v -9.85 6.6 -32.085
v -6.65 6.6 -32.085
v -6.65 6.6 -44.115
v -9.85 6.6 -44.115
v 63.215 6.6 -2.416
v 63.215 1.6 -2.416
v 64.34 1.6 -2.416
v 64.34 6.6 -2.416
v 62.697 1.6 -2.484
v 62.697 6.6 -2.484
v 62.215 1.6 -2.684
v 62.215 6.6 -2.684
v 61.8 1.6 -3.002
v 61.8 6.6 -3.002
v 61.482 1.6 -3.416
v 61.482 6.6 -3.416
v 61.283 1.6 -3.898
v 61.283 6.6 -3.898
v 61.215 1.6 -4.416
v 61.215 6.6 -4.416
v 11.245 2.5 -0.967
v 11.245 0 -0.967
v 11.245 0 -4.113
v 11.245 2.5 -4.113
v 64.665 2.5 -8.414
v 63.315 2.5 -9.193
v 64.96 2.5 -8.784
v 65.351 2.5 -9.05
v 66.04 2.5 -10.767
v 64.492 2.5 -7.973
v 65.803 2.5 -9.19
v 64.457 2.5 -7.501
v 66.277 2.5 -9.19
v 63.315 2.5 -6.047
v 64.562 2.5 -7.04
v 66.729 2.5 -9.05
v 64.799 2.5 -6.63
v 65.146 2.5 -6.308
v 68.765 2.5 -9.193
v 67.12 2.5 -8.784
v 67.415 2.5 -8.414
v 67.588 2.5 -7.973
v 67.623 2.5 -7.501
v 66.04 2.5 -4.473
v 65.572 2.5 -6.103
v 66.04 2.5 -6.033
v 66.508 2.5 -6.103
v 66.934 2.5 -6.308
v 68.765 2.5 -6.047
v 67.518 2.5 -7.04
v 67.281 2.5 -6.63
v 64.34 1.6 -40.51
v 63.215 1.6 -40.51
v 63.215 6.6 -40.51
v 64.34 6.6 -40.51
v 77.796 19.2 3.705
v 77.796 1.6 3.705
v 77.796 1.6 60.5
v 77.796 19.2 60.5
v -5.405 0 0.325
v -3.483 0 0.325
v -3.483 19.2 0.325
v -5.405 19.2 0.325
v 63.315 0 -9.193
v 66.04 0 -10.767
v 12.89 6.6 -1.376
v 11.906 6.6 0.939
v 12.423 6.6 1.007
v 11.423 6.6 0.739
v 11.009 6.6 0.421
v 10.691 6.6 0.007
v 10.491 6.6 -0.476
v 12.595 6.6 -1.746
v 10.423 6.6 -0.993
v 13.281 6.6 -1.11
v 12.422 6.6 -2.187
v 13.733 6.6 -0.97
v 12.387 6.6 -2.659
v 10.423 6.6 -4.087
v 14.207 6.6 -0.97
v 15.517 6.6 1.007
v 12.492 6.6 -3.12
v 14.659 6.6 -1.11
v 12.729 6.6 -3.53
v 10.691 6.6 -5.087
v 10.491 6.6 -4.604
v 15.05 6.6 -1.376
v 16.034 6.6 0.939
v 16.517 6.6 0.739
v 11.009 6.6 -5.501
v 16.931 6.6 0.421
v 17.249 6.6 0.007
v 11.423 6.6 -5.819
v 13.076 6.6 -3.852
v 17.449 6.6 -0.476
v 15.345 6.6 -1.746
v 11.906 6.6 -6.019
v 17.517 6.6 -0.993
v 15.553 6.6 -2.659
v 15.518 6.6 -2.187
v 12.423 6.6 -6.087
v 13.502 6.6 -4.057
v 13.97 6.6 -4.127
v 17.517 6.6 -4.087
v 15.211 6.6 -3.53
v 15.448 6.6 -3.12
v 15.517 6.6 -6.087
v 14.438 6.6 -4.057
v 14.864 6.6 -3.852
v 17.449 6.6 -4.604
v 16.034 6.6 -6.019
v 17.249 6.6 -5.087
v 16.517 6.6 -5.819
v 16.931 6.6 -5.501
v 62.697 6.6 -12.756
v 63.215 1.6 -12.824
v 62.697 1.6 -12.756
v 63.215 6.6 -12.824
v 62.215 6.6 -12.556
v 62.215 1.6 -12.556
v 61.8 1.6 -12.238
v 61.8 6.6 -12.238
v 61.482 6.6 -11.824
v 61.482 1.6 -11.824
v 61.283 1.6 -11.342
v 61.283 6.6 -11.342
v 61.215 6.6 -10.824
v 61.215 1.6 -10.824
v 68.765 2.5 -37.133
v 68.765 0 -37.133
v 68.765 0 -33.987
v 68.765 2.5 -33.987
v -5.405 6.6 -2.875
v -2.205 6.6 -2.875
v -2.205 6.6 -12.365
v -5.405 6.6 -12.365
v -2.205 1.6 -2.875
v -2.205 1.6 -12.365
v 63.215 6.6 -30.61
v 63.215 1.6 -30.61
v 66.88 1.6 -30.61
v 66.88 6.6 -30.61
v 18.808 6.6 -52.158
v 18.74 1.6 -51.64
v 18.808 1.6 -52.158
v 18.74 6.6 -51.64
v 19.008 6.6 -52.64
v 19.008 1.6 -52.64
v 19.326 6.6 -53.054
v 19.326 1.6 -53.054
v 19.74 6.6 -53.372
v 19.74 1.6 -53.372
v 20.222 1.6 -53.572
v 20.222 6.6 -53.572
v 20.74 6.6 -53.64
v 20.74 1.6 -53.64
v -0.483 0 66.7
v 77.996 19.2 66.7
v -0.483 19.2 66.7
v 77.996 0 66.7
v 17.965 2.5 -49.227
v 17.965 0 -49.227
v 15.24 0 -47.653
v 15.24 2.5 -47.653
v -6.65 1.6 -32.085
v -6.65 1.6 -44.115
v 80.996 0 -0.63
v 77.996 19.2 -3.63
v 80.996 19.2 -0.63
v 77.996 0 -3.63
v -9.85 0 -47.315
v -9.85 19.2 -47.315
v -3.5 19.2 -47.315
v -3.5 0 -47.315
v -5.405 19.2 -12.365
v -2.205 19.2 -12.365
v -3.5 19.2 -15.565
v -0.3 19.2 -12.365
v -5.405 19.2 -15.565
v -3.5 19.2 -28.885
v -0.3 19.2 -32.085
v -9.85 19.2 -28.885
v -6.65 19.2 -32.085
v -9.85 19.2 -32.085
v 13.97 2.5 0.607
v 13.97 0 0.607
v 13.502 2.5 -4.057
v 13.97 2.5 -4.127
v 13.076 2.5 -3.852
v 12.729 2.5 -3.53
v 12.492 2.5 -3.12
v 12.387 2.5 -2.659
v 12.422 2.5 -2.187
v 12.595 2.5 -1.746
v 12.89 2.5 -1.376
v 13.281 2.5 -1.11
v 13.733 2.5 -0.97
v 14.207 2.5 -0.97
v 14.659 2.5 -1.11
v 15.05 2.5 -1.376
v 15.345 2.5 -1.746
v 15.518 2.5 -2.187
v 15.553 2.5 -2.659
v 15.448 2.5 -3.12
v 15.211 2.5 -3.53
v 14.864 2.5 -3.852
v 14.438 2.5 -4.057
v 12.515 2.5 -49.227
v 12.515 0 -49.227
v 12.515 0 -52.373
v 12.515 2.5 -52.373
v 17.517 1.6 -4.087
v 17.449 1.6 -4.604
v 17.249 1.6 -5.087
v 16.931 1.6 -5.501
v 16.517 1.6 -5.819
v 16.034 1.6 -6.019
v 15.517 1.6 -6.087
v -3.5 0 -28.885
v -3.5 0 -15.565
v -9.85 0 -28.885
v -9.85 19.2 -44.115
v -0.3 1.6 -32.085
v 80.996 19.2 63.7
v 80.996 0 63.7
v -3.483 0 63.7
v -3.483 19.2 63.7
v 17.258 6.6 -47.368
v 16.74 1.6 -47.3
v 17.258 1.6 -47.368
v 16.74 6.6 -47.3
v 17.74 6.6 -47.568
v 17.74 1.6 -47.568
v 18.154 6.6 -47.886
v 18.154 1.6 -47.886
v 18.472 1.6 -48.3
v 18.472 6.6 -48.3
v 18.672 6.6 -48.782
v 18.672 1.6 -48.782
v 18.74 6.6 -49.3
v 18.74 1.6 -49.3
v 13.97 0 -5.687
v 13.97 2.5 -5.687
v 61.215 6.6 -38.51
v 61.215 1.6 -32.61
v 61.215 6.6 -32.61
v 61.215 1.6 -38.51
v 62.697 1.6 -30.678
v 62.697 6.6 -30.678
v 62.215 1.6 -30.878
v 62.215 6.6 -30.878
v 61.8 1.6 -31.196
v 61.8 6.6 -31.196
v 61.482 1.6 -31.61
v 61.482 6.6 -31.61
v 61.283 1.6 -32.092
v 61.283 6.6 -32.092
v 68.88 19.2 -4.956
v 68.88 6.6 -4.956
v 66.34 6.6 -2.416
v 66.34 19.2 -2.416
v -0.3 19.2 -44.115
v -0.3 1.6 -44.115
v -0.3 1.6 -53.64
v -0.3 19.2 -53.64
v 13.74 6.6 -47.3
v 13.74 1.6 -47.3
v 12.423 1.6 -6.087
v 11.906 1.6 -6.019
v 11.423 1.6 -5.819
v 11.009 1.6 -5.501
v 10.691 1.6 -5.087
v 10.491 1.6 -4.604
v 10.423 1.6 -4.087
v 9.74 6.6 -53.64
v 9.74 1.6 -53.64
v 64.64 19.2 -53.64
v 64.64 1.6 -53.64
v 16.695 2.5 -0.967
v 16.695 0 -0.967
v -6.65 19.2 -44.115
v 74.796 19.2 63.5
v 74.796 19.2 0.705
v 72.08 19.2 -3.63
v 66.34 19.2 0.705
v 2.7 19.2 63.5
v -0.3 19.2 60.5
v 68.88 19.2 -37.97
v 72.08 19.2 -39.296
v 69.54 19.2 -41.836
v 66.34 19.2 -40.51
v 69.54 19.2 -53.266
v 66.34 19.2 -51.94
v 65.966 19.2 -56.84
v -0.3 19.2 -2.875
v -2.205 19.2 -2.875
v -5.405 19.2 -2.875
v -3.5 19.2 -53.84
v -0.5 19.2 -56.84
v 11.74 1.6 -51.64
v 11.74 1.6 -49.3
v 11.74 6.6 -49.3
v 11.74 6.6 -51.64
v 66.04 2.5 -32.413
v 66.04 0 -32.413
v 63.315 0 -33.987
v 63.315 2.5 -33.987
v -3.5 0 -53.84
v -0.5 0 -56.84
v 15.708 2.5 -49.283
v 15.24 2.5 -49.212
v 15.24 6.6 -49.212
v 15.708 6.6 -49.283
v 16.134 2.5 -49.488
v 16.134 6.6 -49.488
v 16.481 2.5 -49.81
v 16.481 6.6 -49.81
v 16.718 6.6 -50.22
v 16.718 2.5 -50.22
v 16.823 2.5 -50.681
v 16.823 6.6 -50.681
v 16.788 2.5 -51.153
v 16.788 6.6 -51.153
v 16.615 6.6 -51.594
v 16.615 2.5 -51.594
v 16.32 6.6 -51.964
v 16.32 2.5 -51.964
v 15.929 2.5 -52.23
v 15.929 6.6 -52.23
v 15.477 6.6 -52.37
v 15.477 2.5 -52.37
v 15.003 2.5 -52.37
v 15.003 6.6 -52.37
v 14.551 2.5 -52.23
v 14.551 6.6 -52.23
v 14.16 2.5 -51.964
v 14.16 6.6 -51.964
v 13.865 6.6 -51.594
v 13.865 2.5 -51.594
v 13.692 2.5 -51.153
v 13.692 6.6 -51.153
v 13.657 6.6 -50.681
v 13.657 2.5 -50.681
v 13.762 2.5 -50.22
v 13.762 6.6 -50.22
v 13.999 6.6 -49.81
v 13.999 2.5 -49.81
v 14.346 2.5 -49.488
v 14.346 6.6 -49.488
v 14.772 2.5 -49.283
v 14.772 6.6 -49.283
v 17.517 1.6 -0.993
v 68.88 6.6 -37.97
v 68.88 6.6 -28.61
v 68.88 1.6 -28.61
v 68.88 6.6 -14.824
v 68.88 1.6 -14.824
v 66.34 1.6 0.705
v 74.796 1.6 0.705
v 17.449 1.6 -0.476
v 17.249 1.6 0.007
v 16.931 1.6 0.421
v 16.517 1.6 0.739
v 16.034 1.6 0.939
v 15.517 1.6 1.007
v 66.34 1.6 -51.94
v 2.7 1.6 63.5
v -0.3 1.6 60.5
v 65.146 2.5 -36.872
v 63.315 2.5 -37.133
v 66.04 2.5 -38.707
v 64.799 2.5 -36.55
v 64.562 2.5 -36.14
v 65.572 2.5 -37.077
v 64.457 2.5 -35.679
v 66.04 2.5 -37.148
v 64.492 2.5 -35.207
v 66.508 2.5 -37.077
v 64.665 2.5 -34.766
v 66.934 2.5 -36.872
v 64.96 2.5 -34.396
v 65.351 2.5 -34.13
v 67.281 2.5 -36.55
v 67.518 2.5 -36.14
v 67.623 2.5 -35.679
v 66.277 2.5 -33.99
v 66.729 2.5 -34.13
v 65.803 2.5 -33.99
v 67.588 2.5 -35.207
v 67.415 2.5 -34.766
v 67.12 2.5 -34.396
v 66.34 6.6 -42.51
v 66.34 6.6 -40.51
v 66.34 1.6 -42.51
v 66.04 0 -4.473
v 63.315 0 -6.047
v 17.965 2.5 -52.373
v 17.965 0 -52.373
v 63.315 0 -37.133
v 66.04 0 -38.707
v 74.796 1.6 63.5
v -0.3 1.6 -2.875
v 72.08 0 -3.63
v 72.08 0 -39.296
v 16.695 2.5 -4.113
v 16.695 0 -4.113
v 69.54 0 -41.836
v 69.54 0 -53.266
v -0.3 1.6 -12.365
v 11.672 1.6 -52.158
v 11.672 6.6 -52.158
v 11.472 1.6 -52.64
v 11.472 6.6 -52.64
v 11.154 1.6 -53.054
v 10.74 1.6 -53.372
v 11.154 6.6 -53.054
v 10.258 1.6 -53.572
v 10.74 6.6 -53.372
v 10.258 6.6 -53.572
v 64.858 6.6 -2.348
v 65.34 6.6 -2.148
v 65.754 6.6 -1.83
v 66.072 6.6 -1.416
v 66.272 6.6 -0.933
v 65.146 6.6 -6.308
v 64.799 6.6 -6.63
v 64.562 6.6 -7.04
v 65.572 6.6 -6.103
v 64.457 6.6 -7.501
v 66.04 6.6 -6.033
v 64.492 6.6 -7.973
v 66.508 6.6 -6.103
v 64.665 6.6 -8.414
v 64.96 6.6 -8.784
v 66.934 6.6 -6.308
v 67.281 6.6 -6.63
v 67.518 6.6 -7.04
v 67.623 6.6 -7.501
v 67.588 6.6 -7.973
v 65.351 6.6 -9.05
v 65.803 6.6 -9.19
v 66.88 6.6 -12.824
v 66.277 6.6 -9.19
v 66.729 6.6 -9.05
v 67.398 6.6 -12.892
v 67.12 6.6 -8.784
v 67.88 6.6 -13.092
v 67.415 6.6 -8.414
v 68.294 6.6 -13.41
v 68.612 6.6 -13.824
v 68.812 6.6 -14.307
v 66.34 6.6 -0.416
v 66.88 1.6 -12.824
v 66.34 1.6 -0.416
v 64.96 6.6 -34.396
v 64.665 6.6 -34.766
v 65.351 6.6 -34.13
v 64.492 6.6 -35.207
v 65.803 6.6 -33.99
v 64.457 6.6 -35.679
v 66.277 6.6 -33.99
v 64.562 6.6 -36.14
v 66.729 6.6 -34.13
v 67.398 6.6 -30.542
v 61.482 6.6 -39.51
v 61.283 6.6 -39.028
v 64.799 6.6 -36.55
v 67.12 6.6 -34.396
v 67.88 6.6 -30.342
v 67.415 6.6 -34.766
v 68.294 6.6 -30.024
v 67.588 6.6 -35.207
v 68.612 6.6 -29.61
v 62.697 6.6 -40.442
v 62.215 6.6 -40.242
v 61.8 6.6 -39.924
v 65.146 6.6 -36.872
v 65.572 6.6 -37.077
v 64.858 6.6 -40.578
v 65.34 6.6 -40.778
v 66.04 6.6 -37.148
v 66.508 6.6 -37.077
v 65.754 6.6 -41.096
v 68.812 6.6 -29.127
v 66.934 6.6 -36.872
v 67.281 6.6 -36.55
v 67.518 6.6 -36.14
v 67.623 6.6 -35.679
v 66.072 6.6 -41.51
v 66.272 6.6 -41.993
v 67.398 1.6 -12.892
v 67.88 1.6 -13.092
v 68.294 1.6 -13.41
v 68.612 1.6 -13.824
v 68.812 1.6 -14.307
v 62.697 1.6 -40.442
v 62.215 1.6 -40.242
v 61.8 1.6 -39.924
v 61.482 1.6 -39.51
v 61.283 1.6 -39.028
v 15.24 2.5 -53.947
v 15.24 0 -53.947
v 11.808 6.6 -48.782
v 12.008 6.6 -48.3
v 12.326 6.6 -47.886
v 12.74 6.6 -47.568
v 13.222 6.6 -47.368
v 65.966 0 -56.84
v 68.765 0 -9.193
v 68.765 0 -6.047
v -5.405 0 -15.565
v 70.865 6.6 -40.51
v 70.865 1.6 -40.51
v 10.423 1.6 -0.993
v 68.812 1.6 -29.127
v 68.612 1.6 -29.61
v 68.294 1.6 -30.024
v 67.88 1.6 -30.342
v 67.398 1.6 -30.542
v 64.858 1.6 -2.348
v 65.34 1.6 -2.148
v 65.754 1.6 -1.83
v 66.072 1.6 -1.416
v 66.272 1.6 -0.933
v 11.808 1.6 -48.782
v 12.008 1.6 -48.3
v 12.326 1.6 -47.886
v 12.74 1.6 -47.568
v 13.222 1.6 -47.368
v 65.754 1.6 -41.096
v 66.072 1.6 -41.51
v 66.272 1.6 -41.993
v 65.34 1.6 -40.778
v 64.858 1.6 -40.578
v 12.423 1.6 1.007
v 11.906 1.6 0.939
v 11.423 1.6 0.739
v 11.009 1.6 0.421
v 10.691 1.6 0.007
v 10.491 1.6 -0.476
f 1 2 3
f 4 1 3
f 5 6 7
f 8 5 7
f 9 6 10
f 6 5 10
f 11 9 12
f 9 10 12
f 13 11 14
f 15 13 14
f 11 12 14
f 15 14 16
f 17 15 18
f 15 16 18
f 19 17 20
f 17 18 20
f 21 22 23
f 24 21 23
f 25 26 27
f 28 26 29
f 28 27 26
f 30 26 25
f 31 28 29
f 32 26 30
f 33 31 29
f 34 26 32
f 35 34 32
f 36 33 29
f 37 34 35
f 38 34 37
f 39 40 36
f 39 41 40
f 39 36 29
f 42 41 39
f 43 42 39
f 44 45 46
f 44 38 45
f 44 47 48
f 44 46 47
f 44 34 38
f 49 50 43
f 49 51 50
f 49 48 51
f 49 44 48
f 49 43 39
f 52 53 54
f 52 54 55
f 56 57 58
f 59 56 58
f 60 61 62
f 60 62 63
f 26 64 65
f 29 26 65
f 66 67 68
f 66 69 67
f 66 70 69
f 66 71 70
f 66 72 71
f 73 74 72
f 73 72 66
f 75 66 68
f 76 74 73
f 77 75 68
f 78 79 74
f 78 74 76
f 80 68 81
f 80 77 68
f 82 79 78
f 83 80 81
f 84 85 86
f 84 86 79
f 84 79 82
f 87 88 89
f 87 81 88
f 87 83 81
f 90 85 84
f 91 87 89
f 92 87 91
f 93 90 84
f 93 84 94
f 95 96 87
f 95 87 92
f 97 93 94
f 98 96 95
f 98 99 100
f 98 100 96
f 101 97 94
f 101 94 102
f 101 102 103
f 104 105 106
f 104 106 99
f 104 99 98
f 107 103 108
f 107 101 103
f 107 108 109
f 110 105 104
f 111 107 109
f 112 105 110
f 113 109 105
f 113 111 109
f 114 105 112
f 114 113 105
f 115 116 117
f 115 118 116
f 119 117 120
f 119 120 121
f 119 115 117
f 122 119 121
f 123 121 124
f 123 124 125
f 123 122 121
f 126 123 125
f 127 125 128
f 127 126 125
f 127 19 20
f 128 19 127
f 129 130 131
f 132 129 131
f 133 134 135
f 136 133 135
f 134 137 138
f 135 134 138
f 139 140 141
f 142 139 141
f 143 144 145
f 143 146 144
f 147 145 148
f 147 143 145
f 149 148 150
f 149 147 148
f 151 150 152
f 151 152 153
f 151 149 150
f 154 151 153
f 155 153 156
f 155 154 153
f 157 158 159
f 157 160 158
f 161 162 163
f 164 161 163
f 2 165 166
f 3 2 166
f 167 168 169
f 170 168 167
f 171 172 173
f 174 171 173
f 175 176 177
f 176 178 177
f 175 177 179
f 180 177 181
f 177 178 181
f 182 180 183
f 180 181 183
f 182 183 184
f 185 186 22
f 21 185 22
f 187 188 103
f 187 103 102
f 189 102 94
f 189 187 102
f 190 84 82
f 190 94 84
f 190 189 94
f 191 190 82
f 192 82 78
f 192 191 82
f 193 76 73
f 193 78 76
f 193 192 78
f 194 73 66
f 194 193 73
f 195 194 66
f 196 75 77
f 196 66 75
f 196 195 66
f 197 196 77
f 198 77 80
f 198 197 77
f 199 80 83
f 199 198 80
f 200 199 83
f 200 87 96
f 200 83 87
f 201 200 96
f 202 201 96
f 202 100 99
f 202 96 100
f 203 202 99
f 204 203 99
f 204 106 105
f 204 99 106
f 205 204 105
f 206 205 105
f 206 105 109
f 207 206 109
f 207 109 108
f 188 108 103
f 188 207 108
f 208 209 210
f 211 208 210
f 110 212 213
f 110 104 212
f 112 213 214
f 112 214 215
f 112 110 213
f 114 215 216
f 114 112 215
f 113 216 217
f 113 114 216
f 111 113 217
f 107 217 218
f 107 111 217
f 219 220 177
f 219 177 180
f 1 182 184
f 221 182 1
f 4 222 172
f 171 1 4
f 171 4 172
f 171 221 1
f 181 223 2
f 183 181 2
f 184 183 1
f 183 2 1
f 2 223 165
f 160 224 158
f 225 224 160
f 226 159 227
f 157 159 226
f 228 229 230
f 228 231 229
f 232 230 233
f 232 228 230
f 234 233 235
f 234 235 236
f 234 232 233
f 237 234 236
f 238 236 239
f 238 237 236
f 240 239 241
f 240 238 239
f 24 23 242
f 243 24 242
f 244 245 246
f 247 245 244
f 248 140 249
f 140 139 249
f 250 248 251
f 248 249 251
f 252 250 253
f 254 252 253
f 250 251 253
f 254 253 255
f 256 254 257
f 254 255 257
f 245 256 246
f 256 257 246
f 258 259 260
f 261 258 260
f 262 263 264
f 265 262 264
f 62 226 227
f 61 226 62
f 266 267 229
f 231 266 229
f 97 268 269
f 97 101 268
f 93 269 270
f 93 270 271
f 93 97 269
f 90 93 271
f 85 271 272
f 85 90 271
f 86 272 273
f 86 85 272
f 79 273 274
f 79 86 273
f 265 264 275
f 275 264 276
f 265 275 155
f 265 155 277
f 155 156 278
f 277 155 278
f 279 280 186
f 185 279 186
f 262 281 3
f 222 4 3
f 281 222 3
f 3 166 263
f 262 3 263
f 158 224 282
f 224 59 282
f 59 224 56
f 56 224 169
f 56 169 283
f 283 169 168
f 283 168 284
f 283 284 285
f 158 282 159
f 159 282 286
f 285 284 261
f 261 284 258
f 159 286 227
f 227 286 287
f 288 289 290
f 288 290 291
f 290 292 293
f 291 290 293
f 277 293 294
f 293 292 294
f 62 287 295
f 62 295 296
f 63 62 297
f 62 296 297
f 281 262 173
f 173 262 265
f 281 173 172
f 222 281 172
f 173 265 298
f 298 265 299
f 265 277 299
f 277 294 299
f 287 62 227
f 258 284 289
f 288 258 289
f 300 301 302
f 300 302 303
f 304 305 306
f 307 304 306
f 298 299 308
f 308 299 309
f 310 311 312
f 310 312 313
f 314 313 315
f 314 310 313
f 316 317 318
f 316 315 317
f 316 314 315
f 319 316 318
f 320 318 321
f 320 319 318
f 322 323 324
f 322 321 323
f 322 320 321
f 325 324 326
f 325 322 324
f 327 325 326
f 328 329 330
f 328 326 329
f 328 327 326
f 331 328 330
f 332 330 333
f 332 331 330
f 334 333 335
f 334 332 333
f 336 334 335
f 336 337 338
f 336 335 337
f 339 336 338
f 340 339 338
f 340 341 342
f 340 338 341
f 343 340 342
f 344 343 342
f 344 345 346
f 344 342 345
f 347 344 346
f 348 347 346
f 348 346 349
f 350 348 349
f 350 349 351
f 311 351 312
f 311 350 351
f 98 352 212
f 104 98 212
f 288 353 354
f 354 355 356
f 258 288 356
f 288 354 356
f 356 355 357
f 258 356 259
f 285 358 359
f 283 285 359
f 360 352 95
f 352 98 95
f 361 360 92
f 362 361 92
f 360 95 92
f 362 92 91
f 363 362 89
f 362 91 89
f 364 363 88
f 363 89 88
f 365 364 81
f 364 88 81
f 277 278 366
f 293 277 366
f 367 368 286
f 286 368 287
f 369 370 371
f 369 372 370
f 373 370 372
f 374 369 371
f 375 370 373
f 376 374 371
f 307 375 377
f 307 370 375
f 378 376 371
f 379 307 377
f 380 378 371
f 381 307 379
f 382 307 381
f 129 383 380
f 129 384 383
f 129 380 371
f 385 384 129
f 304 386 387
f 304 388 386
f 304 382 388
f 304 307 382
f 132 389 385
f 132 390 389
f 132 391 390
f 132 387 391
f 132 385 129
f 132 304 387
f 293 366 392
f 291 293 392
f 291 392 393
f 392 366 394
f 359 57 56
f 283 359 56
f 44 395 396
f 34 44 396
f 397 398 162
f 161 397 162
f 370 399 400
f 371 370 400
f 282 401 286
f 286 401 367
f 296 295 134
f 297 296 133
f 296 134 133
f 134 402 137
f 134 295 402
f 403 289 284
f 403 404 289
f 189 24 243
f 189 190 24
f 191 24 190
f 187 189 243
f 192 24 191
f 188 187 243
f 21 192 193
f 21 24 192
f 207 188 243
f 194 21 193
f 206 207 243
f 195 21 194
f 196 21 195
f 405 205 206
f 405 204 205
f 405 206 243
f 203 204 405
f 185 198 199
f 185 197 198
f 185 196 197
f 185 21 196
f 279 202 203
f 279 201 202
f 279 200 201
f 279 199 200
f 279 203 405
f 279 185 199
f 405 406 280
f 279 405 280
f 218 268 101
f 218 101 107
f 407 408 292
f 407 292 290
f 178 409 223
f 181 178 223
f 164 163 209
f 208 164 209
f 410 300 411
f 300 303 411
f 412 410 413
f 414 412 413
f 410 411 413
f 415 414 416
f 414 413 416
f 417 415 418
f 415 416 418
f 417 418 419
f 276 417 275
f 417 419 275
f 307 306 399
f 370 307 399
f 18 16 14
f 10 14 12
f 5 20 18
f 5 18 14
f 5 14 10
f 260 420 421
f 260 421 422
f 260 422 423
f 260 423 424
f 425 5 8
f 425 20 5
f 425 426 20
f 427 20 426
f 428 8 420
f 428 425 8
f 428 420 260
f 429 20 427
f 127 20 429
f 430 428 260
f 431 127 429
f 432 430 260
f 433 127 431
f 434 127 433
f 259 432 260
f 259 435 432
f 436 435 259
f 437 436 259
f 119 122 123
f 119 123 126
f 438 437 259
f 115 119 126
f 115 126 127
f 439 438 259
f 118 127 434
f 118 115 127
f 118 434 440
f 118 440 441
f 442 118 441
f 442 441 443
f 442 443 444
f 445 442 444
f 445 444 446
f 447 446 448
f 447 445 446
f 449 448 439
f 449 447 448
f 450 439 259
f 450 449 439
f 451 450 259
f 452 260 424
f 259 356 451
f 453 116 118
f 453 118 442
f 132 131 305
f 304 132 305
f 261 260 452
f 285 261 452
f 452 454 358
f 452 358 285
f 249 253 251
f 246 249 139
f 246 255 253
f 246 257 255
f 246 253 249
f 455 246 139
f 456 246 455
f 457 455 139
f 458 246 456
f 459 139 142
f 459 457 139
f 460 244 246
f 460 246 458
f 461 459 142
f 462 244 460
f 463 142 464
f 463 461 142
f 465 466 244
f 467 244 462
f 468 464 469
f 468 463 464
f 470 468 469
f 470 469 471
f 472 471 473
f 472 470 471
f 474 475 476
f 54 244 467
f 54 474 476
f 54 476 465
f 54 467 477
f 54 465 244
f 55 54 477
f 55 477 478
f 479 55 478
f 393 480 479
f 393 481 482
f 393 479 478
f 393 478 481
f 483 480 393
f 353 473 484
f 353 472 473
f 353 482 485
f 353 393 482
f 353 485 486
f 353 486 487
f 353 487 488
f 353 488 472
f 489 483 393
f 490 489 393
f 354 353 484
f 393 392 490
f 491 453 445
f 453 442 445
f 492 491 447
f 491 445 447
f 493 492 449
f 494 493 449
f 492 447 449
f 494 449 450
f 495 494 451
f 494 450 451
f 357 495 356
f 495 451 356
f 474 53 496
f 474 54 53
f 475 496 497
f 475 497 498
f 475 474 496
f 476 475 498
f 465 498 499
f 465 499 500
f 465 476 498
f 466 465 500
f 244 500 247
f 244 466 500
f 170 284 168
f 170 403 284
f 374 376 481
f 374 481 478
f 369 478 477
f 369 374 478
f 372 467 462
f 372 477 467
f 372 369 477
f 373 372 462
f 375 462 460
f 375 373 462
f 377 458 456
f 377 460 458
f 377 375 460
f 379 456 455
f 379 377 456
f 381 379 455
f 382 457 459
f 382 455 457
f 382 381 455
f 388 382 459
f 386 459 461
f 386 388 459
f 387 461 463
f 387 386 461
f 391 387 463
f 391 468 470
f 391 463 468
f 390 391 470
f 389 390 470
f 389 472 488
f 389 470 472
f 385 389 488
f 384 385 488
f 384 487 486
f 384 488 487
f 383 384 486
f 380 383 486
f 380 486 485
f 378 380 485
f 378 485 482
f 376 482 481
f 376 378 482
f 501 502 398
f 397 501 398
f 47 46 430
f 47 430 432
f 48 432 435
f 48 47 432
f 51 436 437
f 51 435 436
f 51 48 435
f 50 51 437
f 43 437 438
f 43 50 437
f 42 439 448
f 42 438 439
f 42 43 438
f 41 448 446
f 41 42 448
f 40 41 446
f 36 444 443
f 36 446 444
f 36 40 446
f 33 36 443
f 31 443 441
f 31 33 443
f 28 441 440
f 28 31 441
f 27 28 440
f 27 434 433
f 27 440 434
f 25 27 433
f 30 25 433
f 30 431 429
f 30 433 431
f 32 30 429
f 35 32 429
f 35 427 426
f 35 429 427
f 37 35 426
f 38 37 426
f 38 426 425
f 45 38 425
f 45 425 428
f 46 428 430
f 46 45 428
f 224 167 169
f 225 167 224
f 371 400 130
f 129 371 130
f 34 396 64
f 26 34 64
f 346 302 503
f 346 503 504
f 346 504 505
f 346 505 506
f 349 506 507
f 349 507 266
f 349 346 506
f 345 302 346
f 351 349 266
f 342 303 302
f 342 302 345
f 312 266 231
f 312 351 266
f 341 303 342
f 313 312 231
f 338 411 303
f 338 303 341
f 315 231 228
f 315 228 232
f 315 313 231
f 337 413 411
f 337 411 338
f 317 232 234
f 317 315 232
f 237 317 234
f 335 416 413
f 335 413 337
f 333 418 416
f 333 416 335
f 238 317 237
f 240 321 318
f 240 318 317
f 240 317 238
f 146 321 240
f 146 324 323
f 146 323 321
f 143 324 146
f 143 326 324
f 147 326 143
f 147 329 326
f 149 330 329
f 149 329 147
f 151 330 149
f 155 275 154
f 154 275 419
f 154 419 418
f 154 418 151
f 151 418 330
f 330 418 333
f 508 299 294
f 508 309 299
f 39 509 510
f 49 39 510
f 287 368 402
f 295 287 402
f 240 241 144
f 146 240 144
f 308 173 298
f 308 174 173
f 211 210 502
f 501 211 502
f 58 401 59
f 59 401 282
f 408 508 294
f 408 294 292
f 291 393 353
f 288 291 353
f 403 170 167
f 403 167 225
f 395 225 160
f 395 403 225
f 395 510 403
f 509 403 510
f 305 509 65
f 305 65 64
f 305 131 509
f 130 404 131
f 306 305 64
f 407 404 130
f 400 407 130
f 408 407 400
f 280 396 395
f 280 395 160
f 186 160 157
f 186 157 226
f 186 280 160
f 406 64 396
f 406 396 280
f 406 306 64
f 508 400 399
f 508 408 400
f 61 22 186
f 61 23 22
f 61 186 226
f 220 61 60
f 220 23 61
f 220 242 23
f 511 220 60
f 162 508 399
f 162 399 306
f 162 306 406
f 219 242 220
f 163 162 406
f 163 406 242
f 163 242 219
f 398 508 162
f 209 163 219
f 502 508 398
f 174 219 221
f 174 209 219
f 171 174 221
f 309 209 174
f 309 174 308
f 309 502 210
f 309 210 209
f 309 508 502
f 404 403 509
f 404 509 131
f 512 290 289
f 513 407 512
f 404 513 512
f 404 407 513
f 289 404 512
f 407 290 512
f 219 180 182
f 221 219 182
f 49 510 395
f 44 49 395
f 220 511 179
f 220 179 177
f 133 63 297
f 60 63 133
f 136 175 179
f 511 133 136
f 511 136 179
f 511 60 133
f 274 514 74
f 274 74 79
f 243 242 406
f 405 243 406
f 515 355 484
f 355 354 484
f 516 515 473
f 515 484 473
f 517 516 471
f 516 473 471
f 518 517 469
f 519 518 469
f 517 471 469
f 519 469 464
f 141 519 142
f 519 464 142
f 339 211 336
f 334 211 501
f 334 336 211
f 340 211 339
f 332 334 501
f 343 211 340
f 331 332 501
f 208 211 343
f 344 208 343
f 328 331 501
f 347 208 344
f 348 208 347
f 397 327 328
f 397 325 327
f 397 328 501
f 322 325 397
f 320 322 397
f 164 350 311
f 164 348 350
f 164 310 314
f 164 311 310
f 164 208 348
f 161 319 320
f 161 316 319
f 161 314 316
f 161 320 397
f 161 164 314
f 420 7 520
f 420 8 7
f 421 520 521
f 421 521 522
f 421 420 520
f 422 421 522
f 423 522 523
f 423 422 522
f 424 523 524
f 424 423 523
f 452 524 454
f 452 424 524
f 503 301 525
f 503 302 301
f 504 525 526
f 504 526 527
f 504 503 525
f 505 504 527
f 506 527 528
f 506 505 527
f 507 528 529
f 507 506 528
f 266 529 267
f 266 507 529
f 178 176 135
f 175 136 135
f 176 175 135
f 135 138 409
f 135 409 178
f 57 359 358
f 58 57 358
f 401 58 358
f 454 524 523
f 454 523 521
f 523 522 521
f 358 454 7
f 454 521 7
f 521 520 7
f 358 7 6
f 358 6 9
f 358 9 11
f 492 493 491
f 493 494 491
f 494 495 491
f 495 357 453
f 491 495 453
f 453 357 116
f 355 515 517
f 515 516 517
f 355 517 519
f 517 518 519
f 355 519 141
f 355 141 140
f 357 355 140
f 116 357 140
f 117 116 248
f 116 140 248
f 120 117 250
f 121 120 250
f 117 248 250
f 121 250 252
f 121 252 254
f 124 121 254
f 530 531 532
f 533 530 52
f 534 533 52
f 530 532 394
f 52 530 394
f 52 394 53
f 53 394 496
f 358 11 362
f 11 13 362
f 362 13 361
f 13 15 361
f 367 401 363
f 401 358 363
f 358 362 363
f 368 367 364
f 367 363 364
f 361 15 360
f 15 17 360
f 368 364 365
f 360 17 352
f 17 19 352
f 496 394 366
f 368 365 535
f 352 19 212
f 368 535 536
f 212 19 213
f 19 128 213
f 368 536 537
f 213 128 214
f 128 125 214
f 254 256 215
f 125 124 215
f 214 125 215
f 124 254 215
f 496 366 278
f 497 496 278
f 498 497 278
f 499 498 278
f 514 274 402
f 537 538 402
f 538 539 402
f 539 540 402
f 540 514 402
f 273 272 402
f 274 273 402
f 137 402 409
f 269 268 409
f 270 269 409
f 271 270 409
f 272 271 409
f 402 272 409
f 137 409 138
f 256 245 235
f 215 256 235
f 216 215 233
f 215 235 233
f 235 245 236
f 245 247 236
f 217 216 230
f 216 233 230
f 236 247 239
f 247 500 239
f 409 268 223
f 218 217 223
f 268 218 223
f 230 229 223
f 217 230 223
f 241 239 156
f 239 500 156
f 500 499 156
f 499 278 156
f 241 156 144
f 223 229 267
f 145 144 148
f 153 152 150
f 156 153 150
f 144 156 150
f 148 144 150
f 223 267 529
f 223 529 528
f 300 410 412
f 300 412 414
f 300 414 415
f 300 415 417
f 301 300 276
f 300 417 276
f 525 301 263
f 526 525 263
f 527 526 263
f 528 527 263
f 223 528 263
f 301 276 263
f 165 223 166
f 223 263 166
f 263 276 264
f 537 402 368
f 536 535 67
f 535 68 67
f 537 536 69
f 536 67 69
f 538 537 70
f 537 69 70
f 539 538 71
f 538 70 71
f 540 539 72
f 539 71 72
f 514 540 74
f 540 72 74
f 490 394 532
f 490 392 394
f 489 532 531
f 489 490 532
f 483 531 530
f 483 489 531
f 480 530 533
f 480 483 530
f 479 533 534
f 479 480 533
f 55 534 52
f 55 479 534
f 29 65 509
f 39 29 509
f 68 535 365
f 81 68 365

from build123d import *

# Parameters (mm, degrees)
BOSS_EXTRUDE1_DEPTH = 1.600000102
BOSS_EXTRUDE2_START = 1.6
BOSS_EXTRUDE2_DEPTH = 17.599999852
SKETCH7_W           = 6.999999716
SKETCH7_H           = 6.999999716
SKETCH7_W_2         = 9.650966474
SKETCH7_H_2         = 9.900528062
SKETCH7_H_3         = 10.408528062
SKETCH7_W_3         = 7.09362233
SKETCH7_H_4         = 7.09362233
BOSS_EXTRUDE4_DEPTH = 4.999999906
SKETCH2_R           = 1.5875
CUT_EXTRUDE3_DEPTH  = 107.667181296
SKETCH6_W           = 9.489999816
SKETCH6_H           = 12.599999946
SKETCH6_W_2         = 12.029999816
CUT_EXTRUDE1_DEPTH  = 7.64499995
FILLET1_R           = 2.000000064
CHAMFER2_SIZE       = 3
CUT_EXTRUDE6_DEPTH  = 2.50000008


with BuildPart() as part:
    # Sketch3 → Boss-Extrude1 (new body)
    with BuildSketch(Plane(origin=(0, 0, 0), x_dir=(1, 0, 0), z_dir=(0, 1, 0))):
        Polygon((72.079999858, 3.630252591), (80.996034335, 3.630252591), (80.996034335, -66.69999995), (-3.483453186, -66.69999995), (-3.483453186, -0.324999858), (-5.404999858, -0.324999858), (-5.404999858, 15.564999858), (-3.499999858, 15.564999858), (-3.499999858, 28.885000142), (-9.849999858, 28.885000142), (-9.849999858, 47.314999858), (-3.499999858, 47.314999858), (-3.499999858, 56.839999858), (65.965747409, 56.839999858), (69.539999858, 53.265747409), (69.539999858, 41.835747409), (72.079999858, 39.295747409), align=None)
    extrude(amount=BOSS_EXTRUDE1_DEPTH)

    # Sketch3<3> → Boss-Extrude2 (add)
    with BuildSketch(Plane(origin=(0, 0, 0), x_dir=(1, 0, 0), z_dir=(0, 1, 0)).offset(BOSS_EXTRUDE2_START)):
        Polygon((72.079999858, 3.630252591), (80.996034335, 3.630252591), (80.996034335, -66.69999995), (-3.483453186, -66.69999995), (-3.483453186, -0.324999858), (-5.404999858, -0.324999858), (-5.404999858, 15.564999858), (-3.499999858, 15.564999858), (-3.499999858, 28.885000142), (-9.849999858, 28.885000142), (-9.849999858, 47.314999858), (-3.499999858, 47.314999858), (-3.499999858, 56.839999858), (65.965747409, 56.839999858), (69.539999858, 53.265747409), (69.539999858, 41.835747409), (72.079999858, 39.295747409), align=None)
        Polygon((77.796034385, -0.705067354), (77.796034385, -63.5), (-0.299999908, -63.5), (-0.299999908, 0), (-0.299999908, 2.875000092), (-2.204999908, 2.875000092), (-2.204999908, 12.364999908), (-0.299999908, 12.364999908), (-0.299999908, 32.085000092), (-6.649999908, 32.085000092), (-6.649999908, 44.114999908), (-0.299999908, 44.114999908), (-0.299999908, 53.639999908), (64.640264031, 53.639999908), (66.339999908, 51.940264031), (66.339999908, 40.510264031), (68.879999908, 37.970264031), (68.879999908, 4.955735969), (66.339999908, 2.415735969), (66.339999908, 0), (66.339999908, -0.705067354), align=None, mode=Mode.SUBTRACT)
    extrude(amount=BOSS_EXTRUDE2_DEPTH)

    # Sketch7 → Boss-Extrude4 (add)
    with BuildSketch(Plane(origin=(0, 1.600000102, 0), x_dir=(1, 0, 0), z_dir=(0, 1, 0))):
        with Locations((15.24, 50.8)):
            Rectangle(SKETCH7_W, SKETCH7_H)
        with Locations((66.04, 35.56)):
            Rectangle(SKETCH7_W_2, SKETCH7_H_2)
        with Locations((66.04, 7.62)):
            Rectangle(SKETCH7_W_2, SKETCH7_H_3)
        with Locations((13.97, 2.54)):
            Rectangle(SKETCH7_W_3, SKETCH7_H_4)
    extrude(amount=BOSS_EXTRUDE4_DEPTH)

    # Sketch2 → Cut-Extrude3 (cut, through all)
    with BuildSketch(Plane(origin=(0, 0, 0), x_dir=(1, 0, 0), z_dir=(0, 1, 0))):
        with Locations(Location((13.97, 2.54, 0), (0, 0, 90))):
            Circle(SKETCH2_R)
        with Locations(Location((15.24, 50.8, 0), (0, 0, 270))):
            Circle(SKETCH2_R)
        with Locations(Location((66.04, 35.56, 0), (0, 0, 90))):
            Circle(SKETCH2_R)
        with Locations(Location((66.04, 7.62, 0), (0, 0, 270))):
            Circle(SKETCH2_R)
    extrude(amount=CUT_EXTRUDE3_DEPTH, mode=Mode.SUBTRACT)

    # Sketch6 → Cut-Extrude1 (cut)
    with BuildSketch(Plane(origin=(-2.204999908, 0, 0), x_dir=(0, 0, -1), z_dir=(1, 0, 0))):
        with Locations((7.62, 12.899999981)):
            Rectangle(SKETCH6_W, SKETCH6_H)
        with Locations((38.1, 12.899999981)):
            Rectangle(SKETCH6_W_2, SKETCH6_H)
    extrude(amount=-CUT_EXTRUDE1_DEPTH, mode=Mode.SUBTRACT)

    # Fillet1
    fillet1_edges = [part.edges().sort_by_distance(p)[0] for p in [
        (11.740000142, 4.100000055, -53.639999908),
        (18.739999858, 4.100000055, -53.639999908),
        (18.739999858, 4.100000055, -47.300000142),
        (11.740000142, 4.100000055, -47.300000142),
        (66.339999908, 4.100000004, -40.510264031),
        (68.879999908, 4.100000055, -30.609735969),
        (61.214516763, 4.100000055, -30.609735969),
        (61.214516763, 4.100000055, -40.510264031),
        (66.339999908, 4.100000004, -2.415735969),
        (68.879999908, 4.100000055, -12.824264031),
        (61.214516763, 4.100000055, -2.415735969),
        (61.214516763, 4.100000055, -12.824264031),
        (10.423188835, 4.100000055, -6.086811165),
        (10.423188835, 4.100000055, 1.006811165),
        (17.516811165, 4.100000055, 1.006811165),
        (17.516811165, 4.100000055, -6.086811165),
    ]]
    fillet(fillet1_edges, radius=FILLET1_R)

    # Chamfer2
    chamfer2_edges = [part.edges().sort_by_distance(p)[0] for p in [
        (-3.499999858, 9.599999926, -56.839999858),
        (80.996034335, 9.599999926, -3.630252591),
        (80.996034335, 9.599999926, 66.69999995),
        (-3.483453186, 9.599999926, 66.69999995),
        (-0.299999908, 10.399999926, 63.5),
        (77.796034385, 10.399999926, 63.5),
        (77.796034385, 10.399999926, 0.705067354),
    ]]
    chamfer(chamfer2_edges, length=CHAMFER2_SIZE)

    # Sketch15 → Cut-Extrude6 (cut)
    with BuildSketch(Plane.XZ):
        Polygon((13.97, 0.60655898), (11.244999989, -0.96672051), (11.244999989, -4.11327949), (13.97, -5.68655898), (16.695000011, -4.11327949), (16.695000011, -0.96672051), align=None)
        Polygon((66.04, -4.47344102), (63.314999989, -6.04672051), (63.314999989, -9.19327949), (66.04, -10.76655898), (68.765000011, -9.19327949), (68.765000011, -6.04672051), align=None)
        Polygon((66.04, -32.41344102), (63.314999989, -33.98672051), (63.314999989, -37.13327949), (66.04, -38.70655898), (68.765000011, -37.13327949), (68.765000011, -33.98672051), align=None)
        Polygon((15.24, -47.65344102), (12.514999989, -49.22672051), (12.514999989, -52.37327949), (15.24, -53.94655898), (17.965000011, -52.37327949), (17.965000011, -49.22672051), align=None)
    extrude(amount=-CUT_EXTRUDE6_DEPTH, mode=Mode.SUBTRACT)


solid = part.part
